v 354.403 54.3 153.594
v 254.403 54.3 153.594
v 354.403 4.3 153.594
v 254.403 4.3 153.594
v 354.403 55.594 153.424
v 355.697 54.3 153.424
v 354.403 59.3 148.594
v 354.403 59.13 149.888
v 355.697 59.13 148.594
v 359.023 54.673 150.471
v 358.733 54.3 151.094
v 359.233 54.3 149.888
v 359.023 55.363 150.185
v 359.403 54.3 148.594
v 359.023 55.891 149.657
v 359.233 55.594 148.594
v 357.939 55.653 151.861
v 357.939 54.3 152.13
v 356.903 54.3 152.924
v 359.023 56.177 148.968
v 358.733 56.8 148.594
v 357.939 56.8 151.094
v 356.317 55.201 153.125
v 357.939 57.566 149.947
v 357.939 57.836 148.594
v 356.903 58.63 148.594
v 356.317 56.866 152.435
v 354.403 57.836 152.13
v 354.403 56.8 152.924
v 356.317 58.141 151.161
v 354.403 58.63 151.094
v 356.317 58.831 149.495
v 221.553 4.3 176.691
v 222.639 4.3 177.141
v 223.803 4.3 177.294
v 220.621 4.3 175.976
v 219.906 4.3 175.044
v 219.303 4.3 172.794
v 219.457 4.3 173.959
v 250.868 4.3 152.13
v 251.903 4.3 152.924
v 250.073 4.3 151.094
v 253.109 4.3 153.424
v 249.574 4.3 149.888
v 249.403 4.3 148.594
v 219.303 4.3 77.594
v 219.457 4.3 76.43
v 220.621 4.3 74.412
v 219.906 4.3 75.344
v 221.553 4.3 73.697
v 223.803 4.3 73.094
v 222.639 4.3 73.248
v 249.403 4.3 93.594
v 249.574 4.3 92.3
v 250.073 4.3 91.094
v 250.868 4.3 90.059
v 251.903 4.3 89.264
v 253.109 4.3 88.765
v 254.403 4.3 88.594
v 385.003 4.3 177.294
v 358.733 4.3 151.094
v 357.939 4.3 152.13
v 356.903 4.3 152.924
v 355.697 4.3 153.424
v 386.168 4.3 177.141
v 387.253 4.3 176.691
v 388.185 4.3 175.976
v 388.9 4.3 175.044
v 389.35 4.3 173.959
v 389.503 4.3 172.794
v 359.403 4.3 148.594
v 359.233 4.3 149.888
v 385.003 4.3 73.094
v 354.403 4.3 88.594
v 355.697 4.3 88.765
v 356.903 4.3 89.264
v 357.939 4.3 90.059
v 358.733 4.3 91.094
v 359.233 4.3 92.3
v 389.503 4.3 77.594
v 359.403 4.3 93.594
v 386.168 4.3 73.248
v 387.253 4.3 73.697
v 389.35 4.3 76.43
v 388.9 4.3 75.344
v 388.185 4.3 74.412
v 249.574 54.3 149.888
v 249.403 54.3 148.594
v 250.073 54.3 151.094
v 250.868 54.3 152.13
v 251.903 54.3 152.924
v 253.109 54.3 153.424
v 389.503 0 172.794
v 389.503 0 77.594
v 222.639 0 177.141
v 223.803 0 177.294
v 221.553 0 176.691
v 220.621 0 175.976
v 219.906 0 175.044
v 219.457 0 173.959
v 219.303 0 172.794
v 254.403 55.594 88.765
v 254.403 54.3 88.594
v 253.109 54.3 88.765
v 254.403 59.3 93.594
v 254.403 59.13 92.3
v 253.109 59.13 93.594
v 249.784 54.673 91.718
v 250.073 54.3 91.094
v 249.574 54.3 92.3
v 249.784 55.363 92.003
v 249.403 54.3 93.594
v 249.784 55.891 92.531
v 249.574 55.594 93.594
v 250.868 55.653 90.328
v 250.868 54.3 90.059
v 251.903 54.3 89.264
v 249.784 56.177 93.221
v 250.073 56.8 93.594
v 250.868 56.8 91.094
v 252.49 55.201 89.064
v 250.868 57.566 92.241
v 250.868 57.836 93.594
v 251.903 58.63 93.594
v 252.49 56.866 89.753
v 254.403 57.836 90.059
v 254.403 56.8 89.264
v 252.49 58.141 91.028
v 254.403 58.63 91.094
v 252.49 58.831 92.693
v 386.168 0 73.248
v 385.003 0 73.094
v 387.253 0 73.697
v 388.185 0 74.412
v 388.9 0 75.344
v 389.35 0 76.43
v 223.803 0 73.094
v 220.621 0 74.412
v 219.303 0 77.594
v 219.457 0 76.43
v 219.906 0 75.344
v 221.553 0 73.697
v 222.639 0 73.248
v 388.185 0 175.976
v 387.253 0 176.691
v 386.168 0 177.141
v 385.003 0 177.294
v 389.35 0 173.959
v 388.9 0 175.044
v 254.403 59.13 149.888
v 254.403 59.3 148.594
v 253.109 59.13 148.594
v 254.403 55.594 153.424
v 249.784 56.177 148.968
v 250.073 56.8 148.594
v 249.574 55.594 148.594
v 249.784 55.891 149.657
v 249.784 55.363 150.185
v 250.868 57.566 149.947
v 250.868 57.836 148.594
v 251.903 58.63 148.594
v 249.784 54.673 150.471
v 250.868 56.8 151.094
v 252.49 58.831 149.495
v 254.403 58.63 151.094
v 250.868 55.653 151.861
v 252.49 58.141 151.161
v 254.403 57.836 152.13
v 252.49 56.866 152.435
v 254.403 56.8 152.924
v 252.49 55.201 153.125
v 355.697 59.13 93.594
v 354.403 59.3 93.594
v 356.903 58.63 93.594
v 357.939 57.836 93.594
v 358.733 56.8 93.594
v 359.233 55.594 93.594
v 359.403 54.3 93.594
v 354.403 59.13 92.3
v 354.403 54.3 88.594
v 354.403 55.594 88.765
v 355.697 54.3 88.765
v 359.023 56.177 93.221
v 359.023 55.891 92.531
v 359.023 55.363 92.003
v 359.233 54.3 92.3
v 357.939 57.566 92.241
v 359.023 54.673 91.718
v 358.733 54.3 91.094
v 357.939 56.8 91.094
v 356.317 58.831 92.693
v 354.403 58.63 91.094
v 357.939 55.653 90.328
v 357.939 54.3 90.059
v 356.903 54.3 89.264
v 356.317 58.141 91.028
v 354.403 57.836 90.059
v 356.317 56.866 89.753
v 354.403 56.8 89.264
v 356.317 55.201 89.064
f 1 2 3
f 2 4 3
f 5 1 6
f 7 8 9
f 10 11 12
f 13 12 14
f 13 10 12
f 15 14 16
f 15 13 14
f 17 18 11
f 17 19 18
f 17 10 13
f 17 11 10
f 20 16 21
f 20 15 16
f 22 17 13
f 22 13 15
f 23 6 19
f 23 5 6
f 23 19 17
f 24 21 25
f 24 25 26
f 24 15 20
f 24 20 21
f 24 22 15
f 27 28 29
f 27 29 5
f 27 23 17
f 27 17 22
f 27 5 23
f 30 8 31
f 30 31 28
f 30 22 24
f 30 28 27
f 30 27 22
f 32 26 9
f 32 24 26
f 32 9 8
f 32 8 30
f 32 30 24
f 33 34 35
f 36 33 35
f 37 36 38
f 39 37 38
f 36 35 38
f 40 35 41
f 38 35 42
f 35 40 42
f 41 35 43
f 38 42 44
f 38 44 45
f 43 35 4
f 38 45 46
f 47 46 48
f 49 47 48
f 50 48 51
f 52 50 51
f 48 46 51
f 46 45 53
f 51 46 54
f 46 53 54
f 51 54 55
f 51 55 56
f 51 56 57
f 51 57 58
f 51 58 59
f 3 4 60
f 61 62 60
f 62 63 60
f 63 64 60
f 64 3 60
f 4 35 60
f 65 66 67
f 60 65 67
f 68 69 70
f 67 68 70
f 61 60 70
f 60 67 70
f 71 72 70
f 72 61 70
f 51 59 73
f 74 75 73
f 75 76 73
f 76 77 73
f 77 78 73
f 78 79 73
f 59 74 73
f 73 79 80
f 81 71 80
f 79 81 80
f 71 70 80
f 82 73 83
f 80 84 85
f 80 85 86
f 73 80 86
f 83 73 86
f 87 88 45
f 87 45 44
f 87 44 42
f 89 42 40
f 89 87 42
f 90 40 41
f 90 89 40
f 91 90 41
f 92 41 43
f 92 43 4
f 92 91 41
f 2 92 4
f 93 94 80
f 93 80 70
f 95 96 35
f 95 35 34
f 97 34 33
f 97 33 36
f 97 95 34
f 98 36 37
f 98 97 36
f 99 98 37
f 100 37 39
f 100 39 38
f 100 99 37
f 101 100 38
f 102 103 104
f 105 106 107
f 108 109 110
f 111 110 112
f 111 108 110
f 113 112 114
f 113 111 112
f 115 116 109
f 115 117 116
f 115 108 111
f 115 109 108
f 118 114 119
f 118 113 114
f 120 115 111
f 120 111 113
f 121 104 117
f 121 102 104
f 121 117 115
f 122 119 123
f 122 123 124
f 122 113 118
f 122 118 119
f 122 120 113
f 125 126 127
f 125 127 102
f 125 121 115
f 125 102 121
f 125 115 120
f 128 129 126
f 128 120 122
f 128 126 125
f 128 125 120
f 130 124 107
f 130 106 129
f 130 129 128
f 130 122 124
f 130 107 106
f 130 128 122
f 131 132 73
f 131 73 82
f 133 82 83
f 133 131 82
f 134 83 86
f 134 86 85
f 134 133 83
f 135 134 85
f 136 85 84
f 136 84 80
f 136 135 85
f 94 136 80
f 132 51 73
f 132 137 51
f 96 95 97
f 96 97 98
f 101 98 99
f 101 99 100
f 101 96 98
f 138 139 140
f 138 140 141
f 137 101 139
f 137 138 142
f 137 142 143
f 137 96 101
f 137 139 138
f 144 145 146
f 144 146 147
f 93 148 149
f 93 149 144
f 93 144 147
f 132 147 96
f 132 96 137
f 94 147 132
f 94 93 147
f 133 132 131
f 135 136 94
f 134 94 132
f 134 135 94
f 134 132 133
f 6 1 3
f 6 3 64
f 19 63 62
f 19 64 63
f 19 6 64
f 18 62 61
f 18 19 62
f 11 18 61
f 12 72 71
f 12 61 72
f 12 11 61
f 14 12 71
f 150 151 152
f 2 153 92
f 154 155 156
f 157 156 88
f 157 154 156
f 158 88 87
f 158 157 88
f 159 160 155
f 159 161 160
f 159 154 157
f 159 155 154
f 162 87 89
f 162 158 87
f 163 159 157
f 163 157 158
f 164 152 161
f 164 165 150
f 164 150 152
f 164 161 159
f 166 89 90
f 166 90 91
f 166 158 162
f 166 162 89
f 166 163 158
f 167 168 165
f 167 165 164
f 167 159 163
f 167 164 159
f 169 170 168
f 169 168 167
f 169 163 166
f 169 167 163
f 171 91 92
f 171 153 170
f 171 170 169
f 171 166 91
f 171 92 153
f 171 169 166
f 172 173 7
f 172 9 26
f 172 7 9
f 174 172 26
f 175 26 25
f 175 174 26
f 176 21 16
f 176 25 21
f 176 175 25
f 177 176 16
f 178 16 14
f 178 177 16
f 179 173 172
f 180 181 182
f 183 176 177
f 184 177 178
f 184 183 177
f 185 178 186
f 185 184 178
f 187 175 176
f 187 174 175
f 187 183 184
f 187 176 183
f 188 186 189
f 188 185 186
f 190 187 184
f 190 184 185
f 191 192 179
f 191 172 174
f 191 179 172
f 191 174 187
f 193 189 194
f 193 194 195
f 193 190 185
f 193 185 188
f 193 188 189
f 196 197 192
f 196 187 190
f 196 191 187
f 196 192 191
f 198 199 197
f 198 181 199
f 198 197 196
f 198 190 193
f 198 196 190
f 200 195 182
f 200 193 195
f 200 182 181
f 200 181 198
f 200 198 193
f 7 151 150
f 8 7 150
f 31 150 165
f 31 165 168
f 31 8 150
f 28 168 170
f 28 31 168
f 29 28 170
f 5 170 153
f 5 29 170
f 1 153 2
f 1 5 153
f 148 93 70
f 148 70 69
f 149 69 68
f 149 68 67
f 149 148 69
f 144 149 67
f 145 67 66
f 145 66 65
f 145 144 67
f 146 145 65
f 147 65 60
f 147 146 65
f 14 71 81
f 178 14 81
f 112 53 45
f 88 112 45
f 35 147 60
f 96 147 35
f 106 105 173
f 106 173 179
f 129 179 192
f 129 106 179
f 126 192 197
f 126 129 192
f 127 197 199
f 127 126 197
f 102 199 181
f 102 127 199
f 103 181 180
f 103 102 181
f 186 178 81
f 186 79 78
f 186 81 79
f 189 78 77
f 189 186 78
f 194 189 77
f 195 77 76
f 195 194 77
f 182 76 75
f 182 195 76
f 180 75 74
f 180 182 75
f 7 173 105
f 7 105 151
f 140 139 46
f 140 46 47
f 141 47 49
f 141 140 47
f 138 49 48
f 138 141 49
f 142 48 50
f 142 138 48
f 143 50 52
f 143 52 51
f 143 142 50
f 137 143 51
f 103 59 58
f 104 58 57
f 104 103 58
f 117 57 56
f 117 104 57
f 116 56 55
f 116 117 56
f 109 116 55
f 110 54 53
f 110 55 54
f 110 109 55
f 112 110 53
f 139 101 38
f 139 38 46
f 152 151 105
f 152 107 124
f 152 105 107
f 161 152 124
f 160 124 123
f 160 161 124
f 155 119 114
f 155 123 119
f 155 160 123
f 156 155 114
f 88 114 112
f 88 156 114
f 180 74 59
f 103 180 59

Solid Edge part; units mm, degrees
sketch "Sketch1" plane through (0, 0, 0) normal (0, -1, 0) x (1, 0, 0)
  arc A0 (385.0032, 73.0943) -> (389.5032, 77.5943) centre (385.0032, 77.5943) ccw
  line L0 (389.5032, 77.5943) -> (389.5032, 172.7943)
  arc A1 (389.5032, 172.7943) -> (385.0032, 177.2943) centre (385.0032, 172.7943) ccw
  line L1 (385.0032, 177.2943) -> (223.8032, 177.2943)
  arc A2 (223.8032, 177.2943) -> (219.3032, 172.7943) centre (223.8032, 172.7943) ccw
  line L2 (219.3032, 172.7943) -> (219.3032, 77.5943)
  arc A3 (219.3032, 77.5943) -> (223.8032, 73.0943) centre (223.8032, 77.5943) ccw
  line L3 (223.8032, 73.0943) -> (385.0032, 73.0943)
extrude "Protrusion1" add sketch "Sketch1" against normal blind 4.3
sketch "Sketch2" plane through (304.4032, 4.3, 125.1943) normal (0, 1, 0) x (-1, 0, 0)
  line L0 (55, 28.4) -> (-55, 28.4)
  line L1 (-55, 28.4) -> (-55, -36.6)
  line L2 (-55, -36.6) -> (55, -36.6)
  line L3 (55, -36.6) -> (55, 28.4)
extrude "ExtrudedProtrusion_2" add sketch "Sketch2" along normal blind 55
fillet "Round_1" radius 5 8 edges at (304.4032, 59.3, 153.5943) (304.4032, 59.3, 88.5943) (359.4032, 59.3, 121.0943) (249.4032, 59.3, 121.0943) (359.4032, 31.8, 153.5943) (359.4032, 31.8, 88.5943) (249.4032, 31.8, 153.5943) (249.4032, 31.8, 88.5943)
